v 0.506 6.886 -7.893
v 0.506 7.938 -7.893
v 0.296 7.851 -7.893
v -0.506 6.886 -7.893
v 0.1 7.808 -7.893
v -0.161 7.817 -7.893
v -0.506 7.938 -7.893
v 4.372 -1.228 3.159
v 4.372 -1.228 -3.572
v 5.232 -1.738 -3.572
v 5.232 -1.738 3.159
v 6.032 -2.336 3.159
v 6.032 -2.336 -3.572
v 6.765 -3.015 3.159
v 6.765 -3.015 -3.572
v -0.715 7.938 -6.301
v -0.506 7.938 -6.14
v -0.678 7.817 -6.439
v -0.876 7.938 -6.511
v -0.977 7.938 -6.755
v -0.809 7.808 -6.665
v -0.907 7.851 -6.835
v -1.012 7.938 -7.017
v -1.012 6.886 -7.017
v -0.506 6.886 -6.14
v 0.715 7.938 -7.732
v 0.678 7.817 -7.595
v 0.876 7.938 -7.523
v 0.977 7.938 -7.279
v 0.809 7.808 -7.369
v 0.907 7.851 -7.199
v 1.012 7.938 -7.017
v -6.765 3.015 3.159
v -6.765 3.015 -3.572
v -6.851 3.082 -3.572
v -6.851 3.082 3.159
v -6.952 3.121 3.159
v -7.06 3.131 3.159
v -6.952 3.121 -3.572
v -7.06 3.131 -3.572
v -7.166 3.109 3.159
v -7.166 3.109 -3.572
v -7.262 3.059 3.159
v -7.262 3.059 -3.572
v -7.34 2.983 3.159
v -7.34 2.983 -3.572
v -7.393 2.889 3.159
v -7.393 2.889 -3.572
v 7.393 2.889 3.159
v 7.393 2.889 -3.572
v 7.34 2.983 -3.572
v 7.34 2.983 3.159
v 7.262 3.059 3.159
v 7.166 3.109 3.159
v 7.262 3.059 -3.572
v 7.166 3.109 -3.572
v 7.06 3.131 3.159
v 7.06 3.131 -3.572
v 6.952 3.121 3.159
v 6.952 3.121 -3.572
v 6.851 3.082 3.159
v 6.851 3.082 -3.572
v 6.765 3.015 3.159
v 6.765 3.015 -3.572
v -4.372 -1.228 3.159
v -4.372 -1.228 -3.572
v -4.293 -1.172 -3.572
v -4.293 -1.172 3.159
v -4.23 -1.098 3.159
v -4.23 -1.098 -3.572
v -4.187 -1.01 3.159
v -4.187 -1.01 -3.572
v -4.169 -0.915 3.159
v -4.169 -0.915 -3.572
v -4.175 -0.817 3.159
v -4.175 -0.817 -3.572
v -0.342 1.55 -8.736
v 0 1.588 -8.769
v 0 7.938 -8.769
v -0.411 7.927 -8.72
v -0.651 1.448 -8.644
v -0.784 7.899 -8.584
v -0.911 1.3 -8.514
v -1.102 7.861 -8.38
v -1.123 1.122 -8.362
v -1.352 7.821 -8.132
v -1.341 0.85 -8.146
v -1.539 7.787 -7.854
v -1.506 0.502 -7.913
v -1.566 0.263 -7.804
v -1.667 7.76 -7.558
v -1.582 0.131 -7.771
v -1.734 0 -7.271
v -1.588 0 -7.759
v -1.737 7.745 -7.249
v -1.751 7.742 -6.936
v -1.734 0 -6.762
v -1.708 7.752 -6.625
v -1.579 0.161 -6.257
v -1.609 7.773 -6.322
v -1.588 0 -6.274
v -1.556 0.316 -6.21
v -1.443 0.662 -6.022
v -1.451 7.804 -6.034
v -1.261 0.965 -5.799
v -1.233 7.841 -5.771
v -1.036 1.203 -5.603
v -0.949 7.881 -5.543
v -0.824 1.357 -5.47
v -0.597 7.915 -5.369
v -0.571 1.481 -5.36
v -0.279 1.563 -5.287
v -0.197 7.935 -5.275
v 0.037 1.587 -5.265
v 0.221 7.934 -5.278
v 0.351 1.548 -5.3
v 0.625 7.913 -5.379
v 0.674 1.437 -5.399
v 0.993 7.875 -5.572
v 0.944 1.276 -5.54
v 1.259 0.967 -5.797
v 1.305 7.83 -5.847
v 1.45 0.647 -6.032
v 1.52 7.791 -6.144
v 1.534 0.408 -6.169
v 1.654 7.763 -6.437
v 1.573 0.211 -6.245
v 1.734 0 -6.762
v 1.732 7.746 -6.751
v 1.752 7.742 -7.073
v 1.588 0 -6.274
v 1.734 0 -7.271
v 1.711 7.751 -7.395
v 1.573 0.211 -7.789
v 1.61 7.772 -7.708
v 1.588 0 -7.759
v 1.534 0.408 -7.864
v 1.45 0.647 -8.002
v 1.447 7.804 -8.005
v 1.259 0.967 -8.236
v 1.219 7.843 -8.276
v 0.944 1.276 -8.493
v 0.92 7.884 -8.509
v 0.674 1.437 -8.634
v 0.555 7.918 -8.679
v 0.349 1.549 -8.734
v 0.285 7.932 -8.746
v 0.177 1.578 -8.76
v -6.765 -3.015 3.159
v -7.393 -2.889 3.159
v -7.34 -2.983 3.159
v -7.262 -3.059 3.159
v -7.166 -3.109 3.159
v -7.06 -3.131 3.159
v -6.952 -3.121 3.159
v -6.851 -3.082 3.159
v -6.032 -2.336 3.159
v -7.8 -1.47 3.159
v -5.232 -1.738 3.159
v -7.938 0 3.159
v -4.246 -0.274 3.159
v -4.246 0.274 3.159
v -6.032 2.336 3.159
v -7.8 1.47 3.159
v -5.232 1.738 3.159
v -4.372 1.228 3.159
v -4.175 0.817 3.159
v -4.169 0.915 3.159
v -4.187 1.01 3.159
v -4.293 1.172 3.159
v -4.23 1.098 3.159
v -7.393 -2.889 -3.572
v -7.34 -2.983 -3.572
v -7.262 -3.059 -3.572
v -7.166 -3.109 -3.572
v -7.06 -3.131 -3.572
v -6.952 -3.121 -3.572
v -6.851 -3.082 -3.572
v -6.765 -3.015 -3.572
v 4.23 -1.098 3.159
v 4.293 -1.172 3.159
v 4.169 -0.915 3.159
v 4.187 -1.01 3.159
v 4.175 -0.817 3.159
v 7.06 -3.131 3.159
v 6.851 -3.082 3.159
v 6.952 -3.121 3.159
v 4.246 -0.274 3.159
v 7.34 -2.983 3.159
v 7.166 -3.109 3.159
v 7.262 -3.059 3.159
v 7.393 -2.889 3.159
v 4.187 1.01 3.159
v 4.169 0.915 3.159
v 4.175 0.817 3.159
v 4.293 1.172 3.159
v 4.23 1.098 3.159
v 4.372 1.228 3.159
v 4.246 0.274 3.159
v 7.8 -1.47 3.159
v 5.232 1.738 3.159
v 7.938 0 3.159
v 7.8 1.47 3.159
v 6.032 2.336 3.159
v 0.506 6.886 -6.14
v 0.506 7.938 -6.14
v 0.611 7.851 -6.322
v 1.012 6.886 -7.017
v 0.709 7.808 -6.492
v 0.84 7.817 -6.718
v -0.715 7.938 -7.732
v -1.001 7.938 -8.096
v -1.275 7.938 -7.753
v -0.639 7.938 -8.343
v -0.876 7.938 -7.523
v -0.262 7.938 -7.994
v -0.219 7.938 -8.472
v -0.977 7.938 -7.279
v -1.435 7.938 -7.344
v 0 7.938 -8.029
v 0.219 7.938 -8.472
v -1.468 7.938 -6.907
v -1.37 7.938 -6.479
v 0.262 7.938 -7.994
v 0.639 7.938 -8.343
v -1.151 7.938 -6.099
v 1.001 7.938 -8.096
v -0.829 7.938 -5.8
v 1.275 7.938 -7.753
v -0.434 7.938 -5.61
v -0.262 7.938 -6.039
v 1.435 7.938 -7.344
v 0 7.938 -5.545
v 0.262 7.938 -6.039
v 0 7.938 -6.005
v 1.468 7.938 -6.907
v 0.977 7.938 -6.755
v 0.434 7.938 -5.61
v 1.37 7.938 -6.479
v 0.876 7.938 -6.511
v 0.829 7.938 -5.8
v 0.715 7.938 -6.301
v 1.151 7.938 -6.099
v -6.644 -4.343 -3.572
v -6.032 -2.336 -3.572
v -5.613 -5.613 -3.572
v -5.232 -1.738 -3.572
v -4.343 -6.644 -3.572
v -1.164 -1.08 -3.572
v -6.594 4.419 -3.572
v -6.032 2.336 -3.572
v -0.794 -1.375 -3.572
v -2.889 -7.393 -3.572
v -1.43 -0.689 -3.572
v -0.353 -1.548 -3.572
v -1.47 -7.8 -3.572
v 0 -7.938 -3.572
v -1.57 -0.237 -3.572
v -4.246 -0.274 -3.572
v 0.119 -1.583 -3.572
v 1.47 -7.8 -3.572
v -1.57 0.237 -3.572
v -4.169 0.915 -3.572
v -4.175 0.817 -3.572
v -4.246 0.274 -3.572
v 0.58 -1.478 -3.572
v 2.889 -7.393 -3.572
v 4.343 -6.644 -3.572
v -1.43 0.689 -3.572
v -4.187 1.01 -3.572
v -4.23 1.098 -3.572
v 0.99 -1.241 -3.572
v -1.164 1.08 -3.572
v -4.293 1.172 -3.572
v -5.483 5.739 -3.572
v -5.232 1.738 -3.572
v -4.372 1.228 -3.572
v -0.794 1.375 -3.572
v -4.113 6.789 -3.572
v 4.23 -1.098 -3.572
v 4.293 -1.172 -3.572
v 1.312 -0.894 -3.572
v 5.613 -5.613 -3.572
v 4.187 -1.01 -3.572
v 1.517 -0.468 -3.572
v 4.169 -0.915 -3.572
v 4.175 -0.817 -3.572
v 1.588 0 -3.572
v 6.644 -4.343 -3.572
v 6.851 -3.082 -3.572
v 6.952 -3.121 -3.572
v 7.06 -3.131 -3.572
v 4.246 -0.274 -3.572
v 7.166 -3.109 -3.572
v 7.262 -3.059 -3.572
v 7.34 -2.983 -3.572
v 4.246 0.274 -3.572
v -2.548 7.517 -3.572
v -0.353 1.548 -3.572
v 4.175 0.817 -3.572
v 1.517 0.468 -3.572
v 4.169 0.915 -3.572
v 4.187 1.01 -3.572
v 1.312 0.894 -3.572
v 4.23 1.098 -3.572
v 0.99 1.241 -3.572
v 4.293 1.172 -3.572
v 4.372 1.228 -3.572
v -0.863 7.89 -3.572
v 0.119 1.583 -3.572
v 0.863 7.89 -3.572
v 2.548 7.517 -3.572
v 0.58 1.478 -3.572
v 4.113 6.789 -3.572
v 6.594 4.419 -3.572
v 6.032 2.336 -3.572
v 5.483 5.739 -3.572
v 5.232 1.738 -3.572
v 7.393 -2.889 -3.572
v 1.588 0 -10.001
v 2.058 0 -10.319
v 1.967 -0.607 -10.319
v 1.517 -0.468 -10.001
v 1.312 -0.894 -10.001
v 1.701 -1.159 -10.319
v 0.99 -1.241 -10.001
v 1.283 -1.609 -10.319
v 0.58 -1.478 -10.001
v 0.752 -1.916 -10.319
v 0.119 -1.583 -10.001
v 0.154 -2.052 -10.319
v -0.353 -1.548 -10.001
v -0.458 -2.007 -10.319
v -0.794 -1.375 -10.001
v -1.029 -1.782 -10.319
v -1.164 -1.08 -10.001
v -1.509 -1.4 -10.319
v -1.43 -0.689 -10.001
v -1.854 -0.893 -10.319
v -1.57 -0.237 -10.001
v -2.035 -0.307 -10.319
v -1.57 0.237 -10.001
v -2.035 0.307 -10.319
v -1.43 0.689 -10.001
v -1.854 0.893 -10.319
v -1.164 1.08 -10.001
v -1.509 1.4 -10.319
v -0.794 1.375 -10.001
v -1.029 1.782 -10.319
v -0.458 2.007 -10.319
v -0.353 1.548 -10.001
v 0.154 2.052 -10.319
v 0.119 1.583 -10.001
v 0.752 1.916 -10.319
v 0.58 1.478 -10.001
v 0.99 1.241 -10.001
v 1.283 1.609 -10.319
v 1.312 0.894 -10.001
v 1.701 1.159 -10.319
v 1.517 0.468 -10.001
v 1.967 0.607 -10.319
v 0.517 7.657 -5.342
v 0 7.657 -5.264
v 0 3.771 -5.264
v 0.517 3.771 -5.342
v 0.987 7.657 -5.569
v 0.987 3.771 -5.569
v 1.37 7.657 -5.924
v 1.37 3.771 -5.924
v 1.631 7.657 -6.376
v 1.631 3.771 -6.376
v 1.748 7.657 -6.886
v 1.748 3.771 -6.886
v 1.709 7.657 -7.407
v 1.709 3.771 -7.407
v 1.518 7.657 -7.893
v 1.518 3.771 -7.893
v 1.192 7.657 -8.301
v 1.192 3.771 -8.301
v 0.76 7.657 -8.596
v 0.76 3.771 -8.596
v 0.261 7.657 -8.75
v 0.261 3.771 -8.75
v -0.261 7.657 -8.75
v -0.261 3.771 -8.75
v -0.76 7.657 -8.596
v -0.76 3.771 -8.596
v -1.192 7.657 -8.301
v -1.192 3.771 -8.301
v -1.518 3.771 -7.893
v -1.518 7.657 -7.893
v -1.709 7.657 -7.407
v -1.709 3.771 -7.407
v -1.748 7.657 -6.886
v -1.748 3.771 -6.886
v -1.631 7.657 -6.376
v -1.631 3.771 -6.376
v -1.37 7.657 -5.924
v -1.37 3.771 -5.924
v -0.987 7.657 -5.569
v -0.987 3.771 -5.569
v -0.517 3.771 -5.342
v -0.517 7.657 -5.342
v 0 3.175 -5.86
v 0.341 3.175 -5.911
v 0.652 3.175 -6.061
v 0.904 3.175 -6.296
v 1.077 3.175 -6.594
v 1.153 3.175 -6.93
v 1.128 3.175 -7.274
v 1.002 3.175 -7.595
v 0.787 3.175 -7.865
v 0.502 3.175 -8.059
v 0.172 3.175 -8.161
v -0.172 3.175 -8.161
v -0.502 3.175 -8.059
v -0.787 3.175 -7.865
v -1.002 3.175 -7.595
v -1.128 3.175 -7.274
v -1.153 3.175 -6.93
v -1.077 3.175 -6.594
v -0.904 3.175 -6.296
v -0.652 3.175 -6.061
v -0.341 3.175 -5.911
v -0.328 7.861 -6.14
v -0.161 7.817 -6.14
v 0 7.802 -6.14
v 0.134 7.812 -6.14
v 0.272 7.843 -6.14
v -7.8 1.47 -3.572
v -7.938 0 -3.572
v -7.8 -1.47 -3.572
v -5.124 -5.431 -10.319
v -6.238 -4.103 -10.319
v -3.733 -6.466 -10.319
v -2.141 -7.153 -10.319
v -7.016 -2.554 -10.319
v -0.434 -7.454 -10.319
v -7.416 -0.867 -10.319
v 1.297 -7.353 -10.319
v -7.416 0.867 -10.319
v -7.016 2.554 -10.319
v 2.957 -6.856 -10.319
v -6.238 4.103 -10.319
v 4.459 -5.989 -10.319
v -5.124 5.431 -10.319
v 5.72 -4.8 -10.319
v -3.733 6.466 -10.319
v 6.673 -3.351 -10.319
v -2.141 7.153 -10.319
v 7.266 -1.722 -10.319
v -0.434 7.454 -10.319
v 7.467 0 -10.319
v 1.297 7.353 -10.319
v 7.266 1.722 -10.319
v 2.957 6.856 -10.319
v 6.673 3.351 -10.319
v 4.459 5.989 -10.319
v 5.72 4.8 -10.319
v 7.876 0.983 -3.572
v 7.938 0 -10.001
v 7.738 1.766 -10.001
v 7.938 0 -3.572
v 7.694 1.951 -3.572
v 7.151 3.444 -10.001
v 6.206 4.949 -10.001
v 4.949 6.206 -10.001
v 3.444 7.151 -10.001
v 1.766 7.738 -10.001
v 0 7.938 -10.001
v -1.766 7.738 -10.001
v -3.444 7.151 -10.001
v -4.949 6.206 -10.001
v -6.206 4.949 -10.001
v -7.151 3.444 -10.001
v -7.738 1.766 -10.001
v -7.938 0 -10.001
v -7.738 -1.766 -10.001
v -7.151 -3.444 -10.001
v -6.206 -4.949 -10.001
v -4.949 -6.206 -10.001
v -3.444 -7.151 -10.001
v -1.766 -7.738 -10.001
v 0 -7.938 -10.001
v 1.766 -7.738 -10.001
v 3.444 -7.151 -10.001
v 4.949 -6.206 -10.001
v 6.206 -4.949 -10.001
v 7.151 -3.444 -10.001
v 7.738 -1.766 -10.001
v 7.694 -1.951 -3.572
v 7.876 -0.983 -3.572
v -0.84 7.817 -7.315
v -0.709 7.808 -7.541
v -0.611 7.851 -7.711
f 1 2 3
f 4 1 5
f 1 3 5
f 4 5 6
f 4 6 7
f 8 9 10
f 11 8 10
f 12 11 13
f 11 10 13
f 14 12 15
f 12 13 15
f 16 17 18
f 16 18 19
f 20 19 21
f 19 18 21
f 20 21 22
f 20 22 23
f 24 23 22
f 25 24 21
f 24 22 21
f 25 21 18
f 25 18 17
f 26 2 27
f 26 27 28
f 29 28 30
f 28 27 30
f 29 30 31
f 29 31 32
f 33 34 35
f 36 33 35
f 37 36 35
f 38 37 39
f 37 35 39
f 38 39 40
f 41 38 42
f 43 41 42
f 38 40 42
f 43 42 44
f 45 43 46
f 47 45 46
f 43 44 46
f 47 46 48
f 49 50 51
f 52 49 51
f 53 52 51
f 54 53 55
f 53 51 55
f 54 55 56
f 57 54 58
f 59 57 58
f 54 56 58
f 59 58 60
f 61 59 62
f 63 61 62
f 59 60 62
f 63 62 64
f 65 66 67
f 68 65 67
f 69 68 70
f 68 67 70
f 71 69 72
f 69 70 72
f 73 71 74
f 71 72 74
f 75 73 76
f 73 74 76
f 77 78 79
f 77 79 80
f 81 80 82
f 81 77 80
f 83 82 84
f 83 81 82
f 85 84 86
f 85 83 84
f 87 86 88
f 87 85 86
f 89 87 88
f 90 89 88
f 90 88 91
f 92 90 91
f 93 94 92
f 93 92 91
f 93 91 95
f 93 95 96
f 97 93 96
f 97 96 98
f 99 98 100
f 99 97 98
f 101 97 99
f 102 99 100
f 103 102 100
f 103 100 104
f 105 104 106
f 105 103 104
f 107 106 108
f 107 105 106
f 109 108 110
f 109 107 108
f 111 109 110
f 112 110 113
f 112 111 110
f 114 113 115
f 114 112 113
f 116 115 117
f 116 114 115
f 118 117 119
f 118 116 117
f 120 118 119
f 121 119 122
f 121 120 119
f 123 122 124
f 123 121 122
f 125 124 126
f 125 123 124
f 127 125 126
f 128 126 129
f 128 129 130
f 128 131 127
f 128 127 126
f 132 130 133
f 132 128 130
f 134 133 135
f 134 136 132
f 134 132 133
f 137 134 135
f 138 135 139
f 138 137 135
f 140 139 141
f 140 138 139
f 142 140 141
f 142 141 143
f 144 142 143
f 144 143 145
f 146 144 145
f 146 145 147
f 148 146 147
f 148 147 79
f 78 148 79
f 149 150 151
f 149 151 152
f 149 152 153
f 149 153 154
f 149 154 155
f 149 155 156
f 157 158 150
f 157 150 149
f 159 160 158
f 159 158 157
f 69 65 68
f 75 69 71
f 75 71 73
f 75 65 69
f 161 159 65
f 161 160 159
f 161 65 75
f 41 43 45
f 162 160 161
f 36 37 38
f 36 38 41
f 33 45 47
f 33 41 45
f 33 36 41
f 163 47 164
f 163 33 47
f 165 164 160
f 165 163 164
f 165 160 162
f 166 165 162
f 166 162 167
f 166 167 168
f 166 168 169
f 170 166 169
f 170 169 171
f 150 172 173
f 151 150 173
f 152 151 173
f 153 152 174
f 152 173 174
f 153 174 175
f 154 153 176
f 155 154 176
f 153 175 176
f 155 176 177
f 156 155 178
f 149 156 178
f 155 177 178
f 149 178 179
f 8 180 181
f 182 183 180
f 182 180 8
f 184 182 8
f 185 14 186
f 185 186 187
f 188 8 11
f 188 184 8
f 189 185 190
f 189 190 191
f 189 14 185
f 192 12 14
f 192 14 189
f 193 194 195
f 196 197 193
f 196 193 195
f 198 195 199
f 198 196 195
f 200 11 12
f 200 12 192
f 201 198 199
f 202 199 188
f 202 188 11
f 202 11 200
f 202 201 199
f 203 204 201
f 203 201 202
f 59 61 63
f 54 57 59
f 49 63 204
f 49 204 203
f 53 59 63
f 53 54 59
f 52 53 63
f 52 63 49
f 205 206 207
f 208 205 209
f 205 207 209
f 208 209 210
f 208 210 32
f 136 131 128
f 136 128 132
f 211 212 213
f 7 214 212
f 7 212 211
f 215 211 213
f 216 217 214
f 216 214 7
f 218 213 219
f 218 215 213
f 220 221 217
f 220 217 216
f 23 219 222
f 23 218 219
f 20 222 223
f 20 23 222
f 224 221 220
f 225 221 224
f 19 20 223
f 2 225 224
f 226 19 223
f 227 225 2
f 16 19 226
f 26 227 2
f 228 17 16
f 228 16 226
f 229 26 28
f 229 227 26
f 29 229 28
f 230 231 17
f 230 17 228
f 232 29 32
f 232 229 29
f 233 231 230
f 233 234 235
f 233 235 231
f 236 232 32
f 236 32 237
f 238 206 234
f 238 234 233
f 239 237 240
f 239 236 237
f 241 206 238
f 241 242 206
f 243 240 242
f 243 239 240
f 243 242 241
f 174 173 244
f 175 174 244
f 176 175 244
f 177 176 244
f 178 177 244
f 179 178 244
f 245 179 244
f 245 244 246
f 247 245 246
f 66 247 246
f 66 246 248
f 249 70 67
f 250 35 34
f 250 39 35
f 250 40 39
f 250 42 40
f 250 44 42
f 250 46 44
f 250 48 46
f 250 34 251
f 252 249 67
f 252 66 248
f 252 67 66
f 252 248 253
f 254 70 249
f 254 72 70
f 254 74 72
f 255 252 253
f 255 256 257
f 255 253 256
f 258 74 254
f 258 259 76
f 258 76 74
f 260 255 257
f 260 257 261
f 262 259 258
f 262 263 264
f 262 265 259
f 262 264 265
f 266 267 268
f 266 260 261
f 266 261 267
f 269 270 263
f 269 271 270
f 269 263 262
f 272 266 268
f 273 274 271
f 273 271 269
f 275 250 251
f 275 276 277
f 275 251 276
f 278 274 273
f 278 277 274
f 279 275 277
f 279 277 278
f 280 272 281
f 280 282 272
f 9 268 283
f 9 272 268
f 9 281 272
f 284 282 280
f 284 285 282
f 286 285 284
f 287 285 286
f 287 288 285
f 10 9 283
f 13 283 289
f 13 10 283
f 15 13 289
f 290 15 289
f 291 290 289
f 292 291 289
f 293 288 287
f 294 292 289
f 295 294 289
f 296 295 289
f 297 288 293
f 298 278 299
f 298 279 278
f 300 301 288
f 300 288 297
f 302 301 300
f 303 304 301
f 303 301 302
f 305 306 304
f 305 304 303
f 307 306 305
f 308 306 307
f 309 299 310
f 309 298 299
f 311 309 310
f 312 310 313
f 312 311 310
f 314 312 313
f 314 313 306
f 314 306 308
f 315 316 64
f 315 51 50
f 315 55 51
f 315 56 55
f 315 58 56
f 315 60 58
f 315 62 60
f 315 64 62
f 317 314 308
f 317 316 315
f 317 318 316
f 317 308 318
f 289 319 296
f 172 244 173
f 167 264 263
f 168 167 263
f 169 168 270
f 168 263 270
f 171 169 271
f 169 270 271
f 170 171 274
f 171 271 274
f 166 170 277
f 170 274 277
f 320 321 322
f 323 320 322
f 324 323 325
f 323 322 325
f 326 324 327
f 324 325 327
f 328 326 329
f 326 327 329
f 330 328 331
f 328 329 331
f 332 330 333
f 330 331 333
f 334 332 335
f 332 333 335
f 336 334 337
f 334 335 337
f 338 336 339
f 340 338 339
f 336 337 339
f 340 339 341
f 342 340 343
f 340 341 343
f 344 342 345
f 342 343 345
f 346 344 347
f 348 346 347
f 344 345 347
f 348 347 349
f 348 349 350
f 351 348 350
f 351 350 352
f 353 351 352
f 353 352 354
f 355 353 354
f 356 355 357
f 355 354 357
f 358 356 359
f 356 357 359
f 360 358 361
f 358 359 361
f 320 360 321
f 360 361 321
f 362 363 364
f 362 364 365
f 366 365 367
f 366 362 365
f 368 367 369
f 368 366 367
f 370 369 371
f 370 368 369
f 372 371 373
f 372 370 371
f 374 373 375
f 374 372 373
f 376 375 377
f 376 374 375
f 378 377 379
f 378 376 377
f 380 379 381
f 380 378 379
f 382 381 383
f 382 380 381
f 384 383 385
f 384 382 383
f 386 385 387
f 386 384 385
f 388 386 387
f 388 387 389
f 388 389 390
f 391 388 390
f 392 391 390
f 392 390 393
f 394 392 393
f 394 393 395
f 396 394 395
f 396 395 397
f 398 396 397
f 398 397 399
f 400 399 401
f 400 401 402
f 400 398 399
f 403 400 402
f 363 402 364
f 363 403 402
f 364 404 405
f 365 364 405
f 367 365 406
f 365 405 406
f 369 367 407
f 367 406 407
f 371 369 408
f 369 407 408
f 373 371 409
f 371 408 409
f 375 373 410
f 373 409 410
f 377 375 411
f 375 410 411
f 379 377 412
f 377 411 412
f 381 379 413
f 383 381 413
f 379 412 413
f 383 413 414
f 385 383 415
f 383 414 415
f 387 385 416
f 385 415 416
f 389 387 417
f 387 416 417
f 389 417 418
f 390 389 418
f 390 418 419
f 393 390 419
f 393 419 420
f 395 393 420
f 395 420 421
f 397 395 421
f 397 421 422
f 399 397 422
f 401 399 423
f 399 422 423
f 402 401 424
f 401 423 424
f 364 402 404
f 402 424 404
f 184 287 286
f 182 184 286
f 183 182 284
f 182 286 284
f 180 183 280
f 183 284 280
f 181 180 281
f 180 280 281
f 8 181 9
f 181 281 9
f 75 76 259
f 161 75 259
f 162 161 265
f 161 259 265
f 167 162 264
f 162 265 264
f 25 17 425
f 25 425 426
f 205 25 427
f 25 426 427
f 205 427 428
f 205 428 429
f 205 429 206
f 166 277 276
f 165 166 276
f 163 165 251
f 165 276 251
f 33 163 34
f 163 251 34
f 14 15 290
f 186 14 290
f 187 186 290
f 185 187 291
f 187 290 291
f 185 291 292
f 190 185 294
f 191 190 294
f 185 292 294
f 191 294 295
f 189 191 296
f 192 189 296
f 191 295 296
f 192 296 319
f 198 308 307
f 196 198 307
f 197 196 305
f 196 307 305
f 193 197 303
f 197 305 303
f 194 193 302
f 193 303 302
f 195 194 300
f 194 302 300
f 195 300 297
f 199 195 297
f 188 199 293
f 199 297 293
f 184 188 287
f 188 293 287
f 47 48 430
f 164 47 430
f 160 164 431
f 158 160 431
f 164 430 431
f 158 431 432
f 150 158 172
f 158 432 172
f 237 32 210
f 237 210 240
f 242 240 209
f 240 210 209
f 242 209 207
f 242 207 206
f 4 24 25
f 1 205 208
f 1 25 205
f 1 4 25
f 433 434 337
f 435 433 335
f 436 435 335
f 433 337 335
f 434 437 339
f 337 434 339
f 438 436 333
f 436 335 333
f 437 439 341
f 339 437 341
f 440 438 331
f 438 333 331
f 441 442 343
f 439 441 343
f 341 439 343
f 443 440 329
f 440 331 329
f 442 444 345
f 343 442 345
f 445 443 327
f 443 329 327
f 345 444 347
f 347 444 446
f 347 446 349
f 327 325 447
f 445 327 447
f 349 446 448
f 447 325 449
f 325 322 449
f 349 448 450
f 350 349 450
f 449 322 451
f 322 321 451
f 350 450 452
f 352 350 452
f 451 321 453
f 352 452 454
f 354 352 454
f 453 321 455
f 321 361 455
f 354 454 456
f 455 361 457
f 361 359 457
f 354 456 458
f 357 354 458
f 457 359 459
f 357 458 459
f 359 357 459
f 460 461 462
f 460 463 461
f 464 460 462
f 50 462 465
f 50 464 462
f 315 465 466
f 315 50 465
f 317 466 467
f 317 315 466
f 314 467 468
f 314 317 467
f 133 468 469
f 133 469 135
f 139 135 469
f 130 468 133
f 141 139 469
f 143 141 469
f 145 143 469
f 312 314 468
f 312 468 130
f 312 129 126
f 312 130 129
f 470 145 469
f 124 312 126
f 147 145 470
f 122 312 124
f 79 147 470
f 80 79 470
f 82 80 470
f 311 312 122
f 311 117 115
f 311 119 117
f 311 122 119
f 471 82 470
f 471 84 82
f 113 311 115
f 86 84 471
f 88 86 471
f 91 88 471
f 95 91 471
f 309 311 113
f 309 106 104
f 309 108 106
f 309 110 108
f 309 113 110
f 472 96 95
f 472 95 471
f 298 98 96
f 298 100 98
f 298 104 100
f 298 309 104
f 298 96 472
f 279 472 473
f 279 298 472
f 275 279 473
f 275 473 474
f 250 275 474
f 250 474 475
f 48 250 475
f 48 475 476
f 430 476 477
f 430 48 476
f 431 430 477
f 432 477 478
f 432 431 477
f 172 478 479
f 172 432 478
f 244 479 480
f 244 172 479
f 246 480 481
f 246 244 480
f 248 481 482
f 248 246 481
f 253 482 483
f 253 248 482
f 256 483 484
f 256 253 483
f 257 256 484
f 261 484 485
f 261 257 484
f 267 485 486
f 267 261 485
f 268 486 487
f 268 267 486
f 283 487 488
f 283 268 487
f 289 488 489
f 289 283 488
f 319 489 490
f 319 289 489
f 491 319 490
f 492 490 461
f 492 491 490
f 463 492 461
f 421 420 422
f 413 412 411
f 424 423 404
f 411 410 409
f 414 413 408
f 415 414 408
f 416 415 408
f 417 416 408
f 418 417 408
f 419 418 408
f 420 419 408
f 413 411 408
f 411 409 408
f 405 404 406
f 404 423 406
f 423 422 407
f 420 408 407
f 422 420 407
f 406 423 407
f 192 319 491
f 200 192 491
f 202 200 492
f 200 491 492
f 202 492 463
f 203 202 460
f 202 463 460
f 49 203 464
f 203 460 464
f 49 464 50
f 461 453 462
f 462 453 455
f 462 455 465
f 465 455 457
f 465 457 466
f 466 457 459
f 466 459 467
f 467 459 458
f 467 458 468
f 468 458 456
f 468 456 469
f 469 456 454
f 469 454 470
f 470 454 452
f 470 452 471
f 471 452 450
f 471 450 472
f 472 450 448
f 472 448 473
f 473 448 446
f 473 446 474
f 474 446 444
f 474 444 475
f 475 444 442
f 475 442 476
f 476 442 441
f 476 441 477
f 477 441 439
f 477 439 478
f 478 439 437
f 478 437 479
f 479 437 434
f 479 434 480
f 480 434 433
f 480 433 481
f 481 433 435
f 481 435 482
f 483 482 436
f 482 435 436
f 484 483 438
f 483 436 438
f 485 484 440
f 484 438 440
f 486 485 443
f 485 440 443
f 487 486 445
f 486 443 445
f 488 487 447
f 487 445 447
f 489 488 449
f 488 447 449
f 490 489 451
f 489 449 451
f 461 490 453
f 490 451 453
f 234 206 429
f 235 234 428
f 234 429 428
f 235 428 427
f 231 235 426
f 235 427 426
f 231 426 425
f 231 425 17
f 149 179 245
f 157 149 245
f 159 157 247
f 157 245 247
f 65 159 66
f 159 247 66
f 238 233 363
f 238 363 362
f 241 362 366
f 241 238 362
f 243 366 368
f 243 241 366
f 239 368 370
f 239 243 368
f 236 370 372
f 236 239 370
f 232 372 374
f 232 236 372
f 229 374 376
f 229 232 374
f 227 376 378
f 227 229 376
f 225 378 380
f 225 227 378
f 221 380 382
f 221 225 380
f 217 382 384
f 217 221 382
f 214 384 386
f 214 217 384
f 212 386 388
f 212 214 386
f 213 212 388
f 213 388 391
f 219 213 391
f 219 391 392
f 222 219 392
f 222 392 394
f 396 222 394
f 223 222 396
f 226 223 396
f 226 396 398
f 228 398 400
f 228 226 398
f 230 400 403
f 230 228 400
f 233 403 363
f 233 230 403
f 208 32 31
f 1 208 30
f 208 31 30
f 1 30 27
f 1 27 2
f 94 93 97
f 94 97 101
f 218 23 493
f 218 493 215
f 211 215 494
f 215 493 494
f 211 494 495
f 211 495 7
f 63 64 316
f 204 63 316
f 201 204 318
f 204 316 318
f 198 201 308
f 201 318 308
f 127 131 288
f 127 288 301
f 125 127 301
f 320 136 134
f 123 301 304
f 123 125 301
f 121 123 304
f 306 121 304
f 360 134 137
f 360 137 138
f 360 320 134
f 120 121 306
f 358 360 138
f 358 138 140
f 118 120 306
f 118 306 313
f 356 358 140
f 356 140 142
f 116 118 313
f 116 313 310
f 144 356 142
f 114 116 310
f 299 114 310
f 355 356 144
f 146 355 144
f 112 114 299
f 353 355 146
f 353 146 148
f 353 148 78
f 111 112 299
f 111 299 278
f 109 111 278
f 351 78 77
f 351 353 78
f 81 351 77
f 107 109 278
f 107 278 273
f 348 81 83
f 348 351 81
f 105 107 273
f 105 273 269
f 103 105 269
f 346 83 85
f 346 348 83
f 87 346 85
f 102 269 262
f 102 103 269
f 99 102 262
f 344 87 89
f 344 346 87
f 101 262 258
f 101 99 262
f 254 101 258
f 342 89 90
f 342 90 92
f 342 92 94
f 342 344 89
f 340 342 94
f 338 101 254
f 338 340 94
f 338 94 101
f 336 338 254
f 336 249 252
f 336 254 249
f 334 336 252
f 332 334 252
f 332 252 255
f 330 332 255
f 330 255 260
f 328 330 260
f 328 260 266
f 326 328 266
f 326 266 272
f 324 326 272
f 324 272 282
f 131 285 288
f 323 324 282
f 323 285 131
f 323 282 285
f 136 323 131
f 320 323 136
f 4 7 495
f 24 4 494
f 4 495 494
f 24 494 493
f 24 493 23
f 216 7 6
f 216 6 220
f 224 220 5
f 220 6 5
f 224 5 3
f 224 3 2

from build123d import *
from OCP.BRepFilletAPI import BRepFilletAPI_MakeChamfer
from build123d.topology import SkipClean

# Parameters (mm, degrees)
BOSS_EXTRUDE1_START     = -3.571875
SKETCH1_R               = 7.9375
BOSS_EXTRUDE1_DEPTH     = 6.746875
BOSS_EXTRUDE4_START     = 6.731
BOSS_EXTRUDE4_DEPTH     = 6.731
FILLET2_R               = 0.381
MOVE_START              = -3.571875
MOVE_FACE3_DEPTH        = 6.731
MOVE_FACE3_2_DEPTH      = 6.731
CIRPATTERN2_START       = -3.571875
CIRPATTERN2_DEPTH       = 6.731
CUT_EXTRUDE5_DEPTH      = 16.24743959
CUT_EXTRUDE5_DEPTH_BACK = 16.24743959
SKETCH15_R              = 1.5875
CHAMFER1_SIZE           = 0.3175
CHAMFER1_SIZE2          = 0.470713108
SKETCH5_R               = 1.7526
CUT_EXTRUDE2_DEPTH      = 16.24743959
SKETCH6_R               = 1.7526
BOSS_EXTRUDE3_DEPTH     = 4.7625
CUT_EXTRUDE3_DEPTH      = 1.05156
CHAMFER3_SIZE           = 0.280416
CHAMFER4_SIZE           = 0.595884


# Read off the part's stored shape, not the designer's step: Move Face3, CirPattern2
with BuildPart() as part:
    # Sketch1 → Boss-Extrude1 (new body)
    with BuildSketch(Plane.XY.offset(BOSS_EXTRUDE1_START)):
        Circle(SKETCH1_R)
    extrude(amount=-BOSS_EXTRUDE1_DEPTH)

    # Sketch10 → Boss-Extrude4 (add)
    with BuildSketch(Plane.XY.offset(-3.571875).offset(BOSS_EXTRUDE4_START)):
        with BuildLine():
            ThreePointArc((-1.096318236, -4.110821886), (0, -4.2545), (1.096318236, -4.110821886))
            ThreePointArc((1.096318236, -4.110821886), (2.111997853, -5.752575517), (3.440933621, -7.152893266))
            ThreePointArc((3.440933621, -7.152893266), (0, -7.9375), (-3.440933621, -7.152893266))
            ThreePointArc((-3.440933621, -7.152893266), (-2.111997853, -5.752575517), (-1.096318236, -4.110821886))
        make_face()
    extrude(amount=-BOSS_EXTRUDE4_DEPTH)

    # Fillet2
    fillet2_edges = [part.edges().sort_by_distance(p)[0] for p in [
        (-3.440933621, -7.152893266, -0.206375),
        (3.440933621, -7.152893266, -0.206375),
        (-1.096318236, -4.110821886, -0.206375),
        (1.096318236, -4.110821886, -0.206375),
    ]]
    fillet(fillet2_edges, radius=FILLET2_R)

    # Move Face3 outline → Move Face3 (cut)
    with BuildSketch(Plane.XY.offset(MOVE_START)):
        with BuildLine():
            ThreePointArc((-3.015425868, -6.764758592), (-3.123679186, -7.113503156), (-2.888846251, -7.393136925))
            ThreePointArc((-2.888846251, -7.393136925), (0, -7.9375), (2.888846251, -7.393136925))
            ThreePointArc((2.888846251, -7.393136925), (3.123679186, -7.113503156), (3.015425868, -6.764758592))
            ThreePointArc((3.015425868, -6.764758592), (2.026423119, -5.639802857), (1.228164561, -4.372350642))
            ThreePointArc((1.228164561, -4.372350642), (1.055516359, -4.205643666), (0.817454229, -4.175229195))
            ThreePointArc((0.817454229, -4.175229195), (0, -4.2545), (-0.817454229, -4.175229195))
            ThreePointArc((-0.817454229, -4.175229195), (-1.055516359, -4.205643666), (-1.228164561, -4.372350642))
            ThreePointArc((-1.228164561, -4.372350642), (-2.026423119, -5.639802857), (-3.015425868, -6.764758592))
        make_face()
    extrude(amount=MOVE_FACE3_DEPTH, mode=Mode.SUBTRACT)

    # Move Face3 2 outline → Move Face3 2 (add)
    with SkipClean():  # the faces are left unmerged after this step: merging them gives an invalid solid
        with BuildSketch(Plane.XY.offset(MOVE_START)):
            with BuildLine():
                ThreePointArc((7.393136925, 2.888846251), (7.113503156, 3.123679186), (6.764758592, 3.015425868))
                ThreePointArc((6.764758592, 3.015425868), (5.639802857, 2.026423119), (4.372350642, 1.228164561))
                ThreePointArc((4.372350642, 1.228164561), (4.205643666, 1.055516359), (4.175229195, 0.817454229))
                ThreePointArc((4.175229195, 0.817454229), (4.2545, 0), (4.175229195, -0.817454229))
                ThreePointArc((4.175229195, -0.817454229), (4.205643666, -1.055516359), (4.372350642, -1.228164561))
                ThreePointArc((4.372350642, -1.228164561), (5.639802857, -2.026423119), (6.764758592, -3.015425868))
                ThreePointArc((6.764758592, -3.015425868), (7.113503156, -3.123679186), (7.393136925, -2.888846251))
                ThreePointArc((7.393136925, -2.888846251), (7.9375, 0), (7.393136925, 2.888846251))
            make_face()
        extrude(amount=MOVE_FACE3_2_DEPTH)

    # CirPattern2 outline → CirPattern2 (add)
    with SkipClean():  # the faces are left unmerged after this step: merging them gives an invalid solid
        with BuildSketch(Plane.XY.offset(CIRPATTERN2_START)):
            with BuildLine():
                ThreePointArc((-4.372350642, 1.228164561), (-5.639802857, 2.026423119), (-6.764758592, 3.015425868))
                ThreePointArc((-6.764758592, 3.015425868), (-7.113503156, 3.123679186), (-7.393136925, 2.888846251))
                ThreePointArc((-7.393136925, 2.888846251), (-7.9375, 0), (-7.393136925, -2.888846251))
                ThreePointArc((-7.393136925, -2.888846251), (-7.113503156, -3.123679186), (-6.764758592, -3.015425868))
                ThreePointArc((-6.764758592, -3.015425868), (-5.639802857, -2.026423119), (-4.372350642, -1.228164561))
                ThreePointArc((-4.372350642, -1.228164561), (-4.205643666, -1.055516359), (-4.175229195, -0.817454229))
                ThreePointArc((-4.175229195, -0.817454229), (-4.2545, 0), (-4.175229195, 0.817454229))
                ThreePointArc((-4.175229195, 0.817454229), (-4.205643666, 1.055516359), (-4.372350642, 1.228164561))
            make_face()
        extrude(amount=CIRPATTERN2_DEPTH)

    # Sketch15 → Cut-Extrude5 (cut, two sides: drawn at the far end of the back side and taken through both)
    with SkipClean():  # the faces are left unmerged after this step: merging them gives an invalid solid
        with BuildSketch(Plane.XY.offset(-CUT_EXTRUDE5_DEPTH_BACK)):
            Circle(SKETCH15_R)
        extrude(amount=CUT_EXTRUDE5_DEPTH + CUT_EXTRUDE5_DEPTH_BACK, mode=Mode.SUBTRACT)

    # Chamfer1: one chamfer whose edges measure the first distance from different faces: ONE call of the kernel's chamfer builder (chamfer() names one face for all edges)
    chamfer1_edges_1 = [part.edges().sort_by_distance(p)[0] for p in [
        (-7.9375, 0, -10.31875),
    ]]
    chamfer1_side_1 = [part.faces().sort_by_distance(p)[0] for p in [
        (-7.9375, 0, -6.9453125),
    ]]
    chamfer1_edges_2 = [part.edges().sort_by_distance(p)[0] for p in [
        (-1.5875, 0, -10.31875),
    ]]
    chamfer1_side_2 = [part.faces().sort_by_distance(p)[0] for p in [
        (-1.5875, 0, -6.9453125),
    ]]
    chamfer1 = BRepFilletAPI_MakeChamfer(part.part.solid().wrapped)
    for e in chamfer1_edges_1:
        chamfer1.Add(CHAMFER1_SIZE, CHAMFER1_SIZE2, e.wrapped, chamfer1_side_1[0].wrapped)  # the first distance lies on this face
    for e in chamfer1_edges_2:
        chamfer1.Add(CHAMFER1_SIZE, CHAMFER1_SIZE2, e.wrapped, chamfer1_side_2[0].wrapped)  # the first distance lies on this face
    add(Compound.cast(chamfer1.Shape()), mode=Mode.REPLACE)

    # Sketch5 → Cut-Extrude2 (cut, through all)
    with SkipClean():  # the faces are left unmerged after this step: merging them gives an invalid solid
        with BuildSketch(Plane(origin=(0, 0, 0), x_dir=(1, 0, 0), z_dir=(0, 1, 0))):
            with Locations(Location((0, 7.01675, 0), (0, 0, 90))):
                Circle(SKETCH5_R)
        extrude(amount=CUT_EXTRUDE2_DEPTH, mode=Mode.SUBTRACT)


with BuildPart() as body_2:
    # Sketch6 → Boss-Extrude3 (new body)
    with BuildSketch(Plane(origin=(0, 7.9375, 0), x_dir=(-1, 0, 0), z_dir=(0, 1, 0))):
        with Locations(Location((0, -7.01675, 0), (0, 0, 90))):
            Circle(SKETCH6_R)
    extrude(amount=-BOSS_EXTRUDE3_DEPTH)

    # Sketch8 → Cut-Extrude3 (cut)
    with BuildSketch(Plane(origin=(0, 7.9375, 0), x_dir=(1, 0, 0), z_dir=(0, 1, 0))):
        Polygon((0.505932041, 6.14045), (1.011864082, 7.01675), (0.505932041, 7.89305), (-0.505932041, 7.89305), (-1.011864082, 7.01675), (-0.505932041, 6.14045), align=None)
    extrude(amount=-CUT_EXTRUDE3_DEPTH, mode=Mode.SUBTRACT)

    # Cut-Extrude4 cone 1 section (through the dimple's axis) → Cut-Extrude4 (revolve, cut)
    with BuildSketch(Plane(origin=(0, 7.9375, -7.01675), x_dir=(0, 0, 1), z_dir=(1, 0, 0))):
        Polygon((0, 0), (1.011864082, 0), (0, 1.011864082), align=None)
    revolve(axis=Axis((0, 7.9375, -7.01675), (0, -1, 0)), mode=Mode.SUBTRACT)

    # Chamfer3
    chamfer3_edges = [body_2.edges().sort_by_distance(p)[0] for p in [
        (0, 7.9375, -8.76935),
    ]]
    chamfer(chamfer3_edges, length=CHAMFER3_SIZE)

    # Chamfer4
    chamfer4_edges = [body_2.edges().sort_by_distance(p)[0] for p in [
        (0, 3.175, -8.76935),
    ]]
    chamfer(chamfer4_edges, length=CHAMFER4_SIZE)


solid = Compound([part.part, body_2.part])
